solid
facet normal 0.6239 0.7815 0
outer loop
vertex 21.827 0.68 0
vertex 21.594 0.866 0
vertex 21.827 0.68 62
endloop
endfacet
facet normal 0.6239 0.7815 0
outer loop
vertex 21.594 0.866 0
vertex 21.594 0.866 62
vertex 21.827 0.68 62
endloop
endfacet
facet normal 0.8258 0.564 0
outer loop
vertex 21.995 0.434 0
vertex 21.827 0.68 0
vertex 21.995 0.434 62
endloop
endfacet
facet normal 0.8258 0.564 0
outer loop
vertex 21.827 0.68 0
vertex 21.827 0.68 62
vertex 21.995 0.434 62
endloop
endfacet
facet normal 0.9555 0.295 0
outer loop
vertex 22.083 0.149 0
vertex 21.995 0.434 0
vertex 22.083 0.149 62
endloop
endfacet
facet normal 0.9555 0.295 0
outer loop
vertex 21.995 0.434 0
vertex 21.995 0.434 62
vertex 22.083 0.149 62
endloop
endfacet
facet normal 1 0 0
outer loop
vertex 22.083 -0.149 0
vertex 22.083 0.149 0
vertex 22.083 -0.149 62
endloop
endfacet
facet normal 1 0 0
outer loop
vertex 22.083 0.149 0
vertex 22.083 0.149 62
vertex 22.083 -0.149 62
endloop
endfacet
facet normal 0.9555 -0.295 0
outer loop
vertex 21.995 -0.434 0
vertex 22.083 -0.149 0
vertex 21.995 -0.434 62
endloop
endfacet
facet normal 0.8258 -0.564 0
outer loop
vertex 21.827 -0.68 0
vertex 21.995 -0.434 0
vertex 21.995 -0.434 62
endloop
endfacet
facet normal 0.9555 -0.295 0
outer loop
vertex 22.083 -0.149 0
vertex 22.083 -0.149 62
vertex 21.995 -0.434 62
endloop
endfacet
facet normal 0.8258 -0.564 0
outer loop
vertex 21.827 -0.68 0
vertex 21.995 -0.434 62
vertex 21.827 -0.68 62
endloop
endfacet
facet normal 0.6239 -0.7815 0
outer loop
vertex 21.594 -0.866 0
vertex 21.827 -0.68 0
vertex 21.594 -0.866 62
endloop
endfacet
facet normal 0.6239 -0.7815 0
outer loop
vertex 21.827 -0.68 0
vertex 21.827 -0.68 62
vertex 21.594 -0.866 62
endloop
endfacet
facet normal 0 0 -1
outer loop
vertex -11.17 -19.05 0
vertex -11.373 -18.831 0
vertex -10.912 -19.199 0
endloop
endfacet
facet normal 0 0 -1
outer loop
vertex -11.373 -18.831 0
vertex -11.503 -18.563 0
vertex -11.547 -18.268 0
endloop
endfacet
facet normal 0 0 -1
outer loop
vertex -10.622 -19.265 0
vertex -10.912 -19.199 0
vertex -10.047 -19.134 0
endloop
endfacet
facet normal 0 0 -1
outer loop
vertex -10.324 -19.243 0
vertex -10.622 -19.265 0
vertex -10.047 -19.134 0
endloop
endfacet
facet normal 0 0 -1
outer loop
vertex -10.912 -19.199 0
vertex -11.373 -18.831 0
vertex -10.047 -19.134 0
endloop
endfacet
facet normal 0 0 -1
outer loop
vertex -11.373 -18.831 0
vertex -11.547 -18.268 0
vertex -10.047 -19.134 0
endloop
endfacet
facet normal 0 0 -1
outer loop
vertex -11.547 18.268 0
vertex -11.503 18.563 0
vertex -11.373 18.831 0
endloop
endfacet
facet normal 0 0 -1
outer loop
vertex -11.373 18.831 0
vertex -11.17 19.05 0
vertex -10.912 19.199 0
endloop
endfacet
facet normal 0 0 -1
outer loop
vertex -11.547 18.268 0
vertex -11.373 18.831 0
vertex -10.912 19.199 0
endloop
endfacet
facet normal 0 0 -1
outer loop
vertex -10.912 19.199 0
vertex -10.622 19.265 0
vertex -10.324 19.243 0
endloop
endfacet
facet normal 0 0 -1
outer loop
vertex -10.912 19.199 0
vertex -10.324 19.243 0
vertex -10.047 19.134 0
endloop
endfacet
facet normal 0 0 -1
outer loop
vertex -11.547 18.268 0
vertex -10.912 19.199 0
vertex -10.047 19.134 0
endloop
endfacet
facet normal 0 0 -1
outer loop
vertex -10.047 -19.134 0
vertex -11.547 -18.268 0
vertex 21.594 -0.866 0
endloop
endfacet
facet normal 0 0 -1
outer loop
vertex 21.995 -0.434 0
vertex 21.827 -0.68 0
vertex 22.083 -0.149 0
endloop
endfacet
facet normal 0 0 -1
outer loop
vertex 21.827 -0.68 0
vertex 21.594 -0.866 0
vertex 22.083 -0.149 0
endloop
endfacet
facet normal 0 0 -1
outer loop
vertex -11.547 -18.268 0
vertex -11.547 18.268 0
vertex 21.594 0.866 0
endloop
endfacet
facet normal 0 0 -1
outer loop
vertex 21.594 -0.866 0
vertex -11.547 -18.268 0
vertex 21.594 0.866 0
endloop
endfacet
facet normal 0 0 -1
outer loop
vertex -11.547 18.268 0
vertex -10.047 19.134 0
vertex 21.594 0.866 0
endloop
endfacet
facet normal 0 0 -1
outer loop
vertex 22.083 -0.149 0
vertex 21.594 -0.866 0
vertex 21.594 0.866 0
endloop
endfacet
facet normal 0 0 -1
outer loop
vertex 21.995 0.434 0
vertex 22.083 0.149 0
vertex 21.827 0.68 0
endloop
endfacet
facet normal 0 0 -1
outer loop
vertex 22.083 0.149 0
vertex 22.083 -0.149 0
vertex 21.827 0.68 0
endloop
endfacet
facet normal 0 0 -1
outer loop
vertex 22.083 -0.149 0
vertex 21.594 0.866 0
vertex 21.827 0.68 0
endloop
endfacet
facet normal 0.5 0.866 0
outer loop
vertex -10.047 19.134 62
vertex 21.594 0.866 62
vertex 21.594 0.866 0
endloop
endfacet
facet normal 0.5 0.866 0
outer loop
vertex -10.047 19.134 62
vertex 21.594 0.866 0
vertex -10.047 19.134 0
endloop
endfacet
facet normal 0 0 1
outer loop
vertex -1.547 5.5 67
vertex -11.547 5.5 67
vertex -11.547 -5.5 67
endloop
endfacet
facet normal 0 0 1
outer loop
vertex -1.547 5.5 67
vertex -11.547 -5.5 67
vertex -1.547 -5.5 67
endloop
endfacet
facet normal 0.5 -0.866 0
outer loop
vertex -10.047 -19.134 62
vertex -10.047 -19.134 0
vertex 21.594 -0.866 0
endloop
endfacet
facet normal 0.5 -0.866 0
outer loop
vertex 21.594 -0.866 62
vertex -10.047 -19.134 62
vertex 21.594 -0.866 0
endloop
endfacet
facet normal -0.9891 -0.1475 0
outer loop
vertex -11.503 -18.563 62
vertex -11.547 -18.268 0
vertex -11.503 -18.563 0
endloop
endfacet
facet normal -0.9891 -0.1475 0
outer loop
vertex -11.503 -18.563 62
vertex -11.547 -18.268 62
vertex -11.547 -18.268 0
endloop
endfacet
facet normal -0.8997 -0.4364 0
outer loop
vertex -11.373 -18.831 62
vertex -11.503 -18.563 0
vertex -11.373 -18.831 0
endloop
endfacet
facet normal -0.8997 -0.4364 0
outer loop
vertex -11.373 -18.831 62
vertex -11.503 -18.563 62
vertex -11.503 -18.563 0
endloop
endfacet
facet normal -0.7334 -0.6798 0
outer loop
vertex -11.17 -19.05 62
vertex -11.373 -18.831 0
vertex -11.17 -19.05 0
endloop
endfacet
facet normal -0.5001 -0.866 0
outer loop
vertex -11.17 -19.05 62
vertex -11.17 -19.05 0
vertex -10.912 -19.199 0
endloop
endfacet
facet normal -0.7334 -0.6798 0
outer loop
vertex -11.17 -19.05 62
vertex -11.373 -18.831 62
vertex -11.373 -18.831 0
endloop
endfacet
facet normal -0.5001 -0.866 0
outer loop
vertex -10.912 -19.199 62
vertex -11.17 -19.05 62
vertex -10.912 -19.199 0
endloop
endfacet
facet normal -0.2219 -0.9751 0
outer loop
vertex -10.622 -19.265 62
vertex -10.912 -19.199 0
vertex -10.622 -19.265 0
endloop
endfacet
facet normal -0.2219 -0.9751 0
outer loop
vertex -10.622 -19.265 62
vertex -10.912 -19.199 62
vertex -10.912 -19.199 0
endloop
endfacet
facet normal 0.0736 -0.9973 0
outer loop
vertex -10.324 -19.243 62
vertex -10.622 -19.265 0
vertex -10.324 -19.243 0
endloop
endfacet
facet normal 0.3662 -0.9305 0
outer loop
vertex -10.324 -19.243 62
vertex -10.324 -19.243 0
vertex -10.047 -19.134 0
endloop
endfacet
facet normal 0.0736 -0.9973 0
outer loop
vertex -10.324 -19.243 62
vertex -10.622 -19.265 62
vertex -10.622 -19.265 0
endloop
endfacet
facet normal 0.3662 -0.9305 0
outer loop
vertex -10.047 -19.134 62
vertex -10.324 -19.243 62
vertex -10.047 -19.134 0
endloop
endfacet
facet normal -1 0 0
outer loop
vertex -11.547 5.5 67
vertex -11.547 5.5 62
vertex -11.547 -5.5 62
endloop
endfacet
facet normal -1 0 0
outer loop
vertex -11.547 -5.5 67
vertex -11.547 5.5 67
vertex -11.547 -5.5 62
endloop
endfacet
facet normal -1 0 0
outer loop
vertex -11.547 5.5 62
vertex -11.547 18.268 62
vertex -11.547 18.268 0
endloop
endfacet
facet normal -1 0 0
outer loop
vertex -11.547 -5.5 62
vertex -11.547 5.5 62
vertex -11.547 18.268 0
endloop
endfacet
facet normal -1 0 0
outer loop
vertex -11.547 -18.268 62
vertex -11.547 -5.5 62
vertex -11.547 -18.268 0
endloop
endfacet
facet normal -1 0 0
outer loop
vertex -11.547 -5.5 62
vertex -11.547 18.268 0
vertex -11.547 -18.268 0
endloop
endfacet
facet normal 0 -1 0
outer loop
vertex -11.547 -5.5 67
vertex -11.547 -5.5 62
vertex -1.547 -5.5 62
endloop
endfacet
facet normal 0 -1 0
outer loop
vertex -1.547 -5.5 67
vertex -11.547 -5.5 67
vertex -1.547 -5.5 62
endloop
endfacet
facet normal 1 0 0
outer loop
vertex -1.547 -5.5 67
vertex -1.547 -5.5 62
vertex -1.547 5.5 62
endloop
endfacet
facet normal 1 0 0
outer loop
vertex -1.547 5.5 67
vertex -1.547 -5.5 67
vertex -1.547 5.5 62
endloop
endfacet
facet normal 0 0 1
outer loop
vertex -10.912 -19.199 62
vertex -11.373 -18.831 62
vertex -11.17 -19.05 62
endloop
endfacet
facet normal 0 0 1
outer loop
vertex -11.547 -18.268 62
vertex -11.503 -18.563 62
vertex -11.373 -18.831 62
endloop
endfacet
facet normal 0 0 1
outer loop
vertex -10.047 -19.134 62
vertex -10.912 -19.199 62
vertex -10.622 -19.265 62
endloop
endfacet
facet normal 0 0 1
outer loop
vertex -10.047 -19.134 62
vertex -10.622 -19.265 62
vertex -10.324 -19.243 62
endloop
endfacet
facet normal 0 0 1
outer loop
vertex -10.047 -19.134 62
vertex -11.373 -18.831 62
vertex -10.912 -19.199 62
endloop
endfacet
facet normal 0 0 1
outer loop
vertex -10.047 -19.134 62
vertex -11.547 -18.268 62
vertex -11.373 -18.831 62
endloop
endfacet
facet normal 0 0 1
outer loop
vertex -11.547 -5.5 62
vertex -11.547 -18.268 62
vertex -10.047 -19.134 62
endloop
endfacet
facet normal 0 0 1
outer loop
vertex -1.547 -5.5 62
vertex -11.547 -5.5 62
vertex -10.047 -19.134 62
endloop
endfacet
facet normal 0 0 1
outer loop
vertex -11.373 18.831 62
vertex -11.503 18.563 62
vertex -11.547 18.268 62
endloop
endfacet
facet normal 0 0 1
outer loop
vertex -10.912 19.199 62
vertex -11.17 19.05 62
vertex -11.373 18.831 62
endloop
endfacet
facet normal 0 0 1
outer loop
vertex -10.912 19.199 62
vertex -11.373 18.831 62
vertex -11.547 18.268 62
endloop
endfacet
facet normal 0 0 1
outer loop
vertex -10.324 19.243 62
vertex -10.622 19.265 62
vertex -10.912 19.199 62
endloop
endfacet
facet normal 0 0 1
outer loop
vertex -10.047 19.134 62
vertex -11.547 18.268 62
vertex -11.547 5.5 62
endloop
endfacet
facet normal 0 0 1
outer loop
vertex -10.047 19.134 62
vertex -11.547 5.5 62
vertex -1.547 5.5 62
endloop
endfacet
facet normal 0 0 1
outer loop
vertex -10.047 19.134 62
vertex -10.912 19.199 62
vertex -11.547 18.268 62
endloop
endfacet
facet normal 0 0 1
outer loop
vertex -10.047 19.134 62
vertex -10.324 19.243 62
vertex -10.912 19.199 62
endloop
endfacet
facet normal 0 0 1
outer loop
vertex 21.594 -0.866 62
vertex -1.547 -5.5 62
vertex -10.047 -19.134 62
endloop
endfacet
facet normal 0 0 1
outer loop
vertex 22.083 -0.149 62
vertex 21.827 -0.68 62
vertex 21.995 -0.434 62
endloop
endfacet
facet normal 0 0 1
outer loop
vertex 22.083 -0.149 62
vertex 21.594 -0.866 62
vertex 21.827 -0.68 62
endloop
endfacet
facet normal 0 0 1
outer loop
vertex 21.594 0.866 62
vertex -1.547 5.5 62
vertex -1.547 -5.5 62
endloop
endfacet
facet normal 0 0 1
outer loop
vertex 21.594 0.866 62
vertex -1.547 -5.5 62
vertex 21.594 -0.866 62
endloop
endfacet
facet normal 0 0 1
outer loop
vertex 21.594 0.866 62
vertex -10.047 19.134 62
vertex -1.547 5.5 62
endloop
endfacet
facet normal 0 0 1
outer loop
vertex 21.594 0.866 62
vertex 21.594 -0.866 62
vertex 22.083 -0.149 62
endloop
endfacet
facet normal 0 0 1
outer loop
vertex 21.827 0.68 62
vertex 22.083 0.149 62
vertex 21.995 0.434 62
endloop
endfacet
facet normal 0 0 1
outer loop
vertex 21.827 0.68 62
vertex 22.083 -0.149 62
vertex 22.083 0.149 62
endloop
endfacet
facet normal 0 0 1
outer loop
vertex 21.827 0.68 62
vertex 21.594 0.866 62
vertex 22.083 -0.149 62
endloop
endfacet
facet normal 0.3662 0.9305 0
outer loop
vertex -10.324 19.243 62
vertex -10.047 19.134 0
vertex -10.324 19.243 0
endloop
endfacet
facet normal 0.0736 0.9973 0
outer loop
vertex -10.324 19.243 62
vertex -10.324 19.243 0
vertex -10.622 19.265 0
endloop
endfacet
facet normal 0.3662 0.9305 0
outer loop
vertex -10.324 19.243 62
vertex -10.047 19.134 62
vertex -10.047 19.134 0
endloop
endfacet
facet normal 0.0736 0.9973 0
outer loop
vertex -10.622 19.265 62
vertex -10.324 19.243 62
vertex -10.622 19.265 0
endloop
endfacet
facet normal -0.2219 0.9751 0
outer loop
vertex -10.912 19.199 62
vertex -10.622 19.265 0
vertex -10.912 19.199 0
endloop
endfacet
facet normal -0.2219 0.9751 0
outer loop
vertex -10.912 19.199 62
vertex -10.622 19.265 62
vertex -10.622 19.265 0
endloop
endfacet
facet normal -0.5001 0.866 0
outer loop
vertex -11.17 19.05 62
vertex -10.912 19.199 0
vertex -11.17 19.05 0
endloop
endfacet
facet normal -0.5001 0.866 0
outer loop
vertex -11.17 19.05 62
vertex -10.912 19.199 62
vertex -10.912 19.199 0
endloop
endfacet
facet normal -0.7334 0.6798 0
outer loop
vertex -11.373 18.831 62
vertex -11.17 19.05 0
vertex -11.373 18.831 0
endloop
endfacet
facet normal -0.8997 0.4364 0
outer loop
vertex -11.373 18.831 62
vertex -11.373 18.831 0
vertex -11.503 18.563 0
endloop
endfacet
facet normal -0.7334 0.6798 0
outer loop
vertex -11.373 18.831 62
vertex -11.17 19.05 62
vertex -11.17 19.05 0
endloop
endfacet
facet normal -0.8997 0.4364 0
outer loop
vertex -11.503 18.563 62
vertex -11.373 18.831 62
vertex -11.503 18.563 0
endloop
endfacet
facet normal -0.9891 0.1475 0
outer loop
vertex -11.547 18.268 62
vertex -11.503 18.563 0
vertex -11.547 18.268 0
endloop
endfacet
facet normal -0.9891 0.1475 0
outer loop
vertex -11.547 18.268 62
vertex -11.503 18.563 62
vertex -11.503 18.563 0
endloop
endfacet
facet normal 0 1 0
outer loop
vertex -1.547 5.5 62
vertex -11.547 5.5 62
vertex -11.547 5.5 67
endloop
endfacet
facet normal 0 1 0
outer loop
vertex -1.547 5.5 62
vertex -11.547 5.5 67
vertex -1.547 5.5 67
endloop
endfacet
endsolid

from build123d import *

# Parameters (mm, degrees)
PAD_DEPTH    = 62
FILLET_R     = 1
SKETCH001_W  = 10
SKETCH001_H  = 11
PAD001_DEPTH = 5


with BuildPart() as part:
    # Sketch (on XY_Plane of Origin) → Pad (new body)
    with BuildSketch(Plane.XY):
        Polygon((23.094011, 0), (-11.547005, 20), (-11.547005, -20), align=None)
    extrude(amount=PAD_DEPTH)

    # Fillet
    fillet_edges = [part.edges().sort_by_distance(p)[0] for p in [
        (-11.547005, 20, 31),
        (23.094011, 0, 31),
        (-11.547005, -20, 31),
    ]]
    fillet(fillet_edges, radius=FILLET_R)

    # Sketch001 (on Face5 of Fillet) → Pad001 (join)
    with BuildSketch(Plane.XY.offset(62)):
        with Locations((-6.547005, 0)):
            Rectangle(SKETCH001_W, SKETCH001_H)
    extrude(amount=PAD001_DEPTH)


solid = part.part
